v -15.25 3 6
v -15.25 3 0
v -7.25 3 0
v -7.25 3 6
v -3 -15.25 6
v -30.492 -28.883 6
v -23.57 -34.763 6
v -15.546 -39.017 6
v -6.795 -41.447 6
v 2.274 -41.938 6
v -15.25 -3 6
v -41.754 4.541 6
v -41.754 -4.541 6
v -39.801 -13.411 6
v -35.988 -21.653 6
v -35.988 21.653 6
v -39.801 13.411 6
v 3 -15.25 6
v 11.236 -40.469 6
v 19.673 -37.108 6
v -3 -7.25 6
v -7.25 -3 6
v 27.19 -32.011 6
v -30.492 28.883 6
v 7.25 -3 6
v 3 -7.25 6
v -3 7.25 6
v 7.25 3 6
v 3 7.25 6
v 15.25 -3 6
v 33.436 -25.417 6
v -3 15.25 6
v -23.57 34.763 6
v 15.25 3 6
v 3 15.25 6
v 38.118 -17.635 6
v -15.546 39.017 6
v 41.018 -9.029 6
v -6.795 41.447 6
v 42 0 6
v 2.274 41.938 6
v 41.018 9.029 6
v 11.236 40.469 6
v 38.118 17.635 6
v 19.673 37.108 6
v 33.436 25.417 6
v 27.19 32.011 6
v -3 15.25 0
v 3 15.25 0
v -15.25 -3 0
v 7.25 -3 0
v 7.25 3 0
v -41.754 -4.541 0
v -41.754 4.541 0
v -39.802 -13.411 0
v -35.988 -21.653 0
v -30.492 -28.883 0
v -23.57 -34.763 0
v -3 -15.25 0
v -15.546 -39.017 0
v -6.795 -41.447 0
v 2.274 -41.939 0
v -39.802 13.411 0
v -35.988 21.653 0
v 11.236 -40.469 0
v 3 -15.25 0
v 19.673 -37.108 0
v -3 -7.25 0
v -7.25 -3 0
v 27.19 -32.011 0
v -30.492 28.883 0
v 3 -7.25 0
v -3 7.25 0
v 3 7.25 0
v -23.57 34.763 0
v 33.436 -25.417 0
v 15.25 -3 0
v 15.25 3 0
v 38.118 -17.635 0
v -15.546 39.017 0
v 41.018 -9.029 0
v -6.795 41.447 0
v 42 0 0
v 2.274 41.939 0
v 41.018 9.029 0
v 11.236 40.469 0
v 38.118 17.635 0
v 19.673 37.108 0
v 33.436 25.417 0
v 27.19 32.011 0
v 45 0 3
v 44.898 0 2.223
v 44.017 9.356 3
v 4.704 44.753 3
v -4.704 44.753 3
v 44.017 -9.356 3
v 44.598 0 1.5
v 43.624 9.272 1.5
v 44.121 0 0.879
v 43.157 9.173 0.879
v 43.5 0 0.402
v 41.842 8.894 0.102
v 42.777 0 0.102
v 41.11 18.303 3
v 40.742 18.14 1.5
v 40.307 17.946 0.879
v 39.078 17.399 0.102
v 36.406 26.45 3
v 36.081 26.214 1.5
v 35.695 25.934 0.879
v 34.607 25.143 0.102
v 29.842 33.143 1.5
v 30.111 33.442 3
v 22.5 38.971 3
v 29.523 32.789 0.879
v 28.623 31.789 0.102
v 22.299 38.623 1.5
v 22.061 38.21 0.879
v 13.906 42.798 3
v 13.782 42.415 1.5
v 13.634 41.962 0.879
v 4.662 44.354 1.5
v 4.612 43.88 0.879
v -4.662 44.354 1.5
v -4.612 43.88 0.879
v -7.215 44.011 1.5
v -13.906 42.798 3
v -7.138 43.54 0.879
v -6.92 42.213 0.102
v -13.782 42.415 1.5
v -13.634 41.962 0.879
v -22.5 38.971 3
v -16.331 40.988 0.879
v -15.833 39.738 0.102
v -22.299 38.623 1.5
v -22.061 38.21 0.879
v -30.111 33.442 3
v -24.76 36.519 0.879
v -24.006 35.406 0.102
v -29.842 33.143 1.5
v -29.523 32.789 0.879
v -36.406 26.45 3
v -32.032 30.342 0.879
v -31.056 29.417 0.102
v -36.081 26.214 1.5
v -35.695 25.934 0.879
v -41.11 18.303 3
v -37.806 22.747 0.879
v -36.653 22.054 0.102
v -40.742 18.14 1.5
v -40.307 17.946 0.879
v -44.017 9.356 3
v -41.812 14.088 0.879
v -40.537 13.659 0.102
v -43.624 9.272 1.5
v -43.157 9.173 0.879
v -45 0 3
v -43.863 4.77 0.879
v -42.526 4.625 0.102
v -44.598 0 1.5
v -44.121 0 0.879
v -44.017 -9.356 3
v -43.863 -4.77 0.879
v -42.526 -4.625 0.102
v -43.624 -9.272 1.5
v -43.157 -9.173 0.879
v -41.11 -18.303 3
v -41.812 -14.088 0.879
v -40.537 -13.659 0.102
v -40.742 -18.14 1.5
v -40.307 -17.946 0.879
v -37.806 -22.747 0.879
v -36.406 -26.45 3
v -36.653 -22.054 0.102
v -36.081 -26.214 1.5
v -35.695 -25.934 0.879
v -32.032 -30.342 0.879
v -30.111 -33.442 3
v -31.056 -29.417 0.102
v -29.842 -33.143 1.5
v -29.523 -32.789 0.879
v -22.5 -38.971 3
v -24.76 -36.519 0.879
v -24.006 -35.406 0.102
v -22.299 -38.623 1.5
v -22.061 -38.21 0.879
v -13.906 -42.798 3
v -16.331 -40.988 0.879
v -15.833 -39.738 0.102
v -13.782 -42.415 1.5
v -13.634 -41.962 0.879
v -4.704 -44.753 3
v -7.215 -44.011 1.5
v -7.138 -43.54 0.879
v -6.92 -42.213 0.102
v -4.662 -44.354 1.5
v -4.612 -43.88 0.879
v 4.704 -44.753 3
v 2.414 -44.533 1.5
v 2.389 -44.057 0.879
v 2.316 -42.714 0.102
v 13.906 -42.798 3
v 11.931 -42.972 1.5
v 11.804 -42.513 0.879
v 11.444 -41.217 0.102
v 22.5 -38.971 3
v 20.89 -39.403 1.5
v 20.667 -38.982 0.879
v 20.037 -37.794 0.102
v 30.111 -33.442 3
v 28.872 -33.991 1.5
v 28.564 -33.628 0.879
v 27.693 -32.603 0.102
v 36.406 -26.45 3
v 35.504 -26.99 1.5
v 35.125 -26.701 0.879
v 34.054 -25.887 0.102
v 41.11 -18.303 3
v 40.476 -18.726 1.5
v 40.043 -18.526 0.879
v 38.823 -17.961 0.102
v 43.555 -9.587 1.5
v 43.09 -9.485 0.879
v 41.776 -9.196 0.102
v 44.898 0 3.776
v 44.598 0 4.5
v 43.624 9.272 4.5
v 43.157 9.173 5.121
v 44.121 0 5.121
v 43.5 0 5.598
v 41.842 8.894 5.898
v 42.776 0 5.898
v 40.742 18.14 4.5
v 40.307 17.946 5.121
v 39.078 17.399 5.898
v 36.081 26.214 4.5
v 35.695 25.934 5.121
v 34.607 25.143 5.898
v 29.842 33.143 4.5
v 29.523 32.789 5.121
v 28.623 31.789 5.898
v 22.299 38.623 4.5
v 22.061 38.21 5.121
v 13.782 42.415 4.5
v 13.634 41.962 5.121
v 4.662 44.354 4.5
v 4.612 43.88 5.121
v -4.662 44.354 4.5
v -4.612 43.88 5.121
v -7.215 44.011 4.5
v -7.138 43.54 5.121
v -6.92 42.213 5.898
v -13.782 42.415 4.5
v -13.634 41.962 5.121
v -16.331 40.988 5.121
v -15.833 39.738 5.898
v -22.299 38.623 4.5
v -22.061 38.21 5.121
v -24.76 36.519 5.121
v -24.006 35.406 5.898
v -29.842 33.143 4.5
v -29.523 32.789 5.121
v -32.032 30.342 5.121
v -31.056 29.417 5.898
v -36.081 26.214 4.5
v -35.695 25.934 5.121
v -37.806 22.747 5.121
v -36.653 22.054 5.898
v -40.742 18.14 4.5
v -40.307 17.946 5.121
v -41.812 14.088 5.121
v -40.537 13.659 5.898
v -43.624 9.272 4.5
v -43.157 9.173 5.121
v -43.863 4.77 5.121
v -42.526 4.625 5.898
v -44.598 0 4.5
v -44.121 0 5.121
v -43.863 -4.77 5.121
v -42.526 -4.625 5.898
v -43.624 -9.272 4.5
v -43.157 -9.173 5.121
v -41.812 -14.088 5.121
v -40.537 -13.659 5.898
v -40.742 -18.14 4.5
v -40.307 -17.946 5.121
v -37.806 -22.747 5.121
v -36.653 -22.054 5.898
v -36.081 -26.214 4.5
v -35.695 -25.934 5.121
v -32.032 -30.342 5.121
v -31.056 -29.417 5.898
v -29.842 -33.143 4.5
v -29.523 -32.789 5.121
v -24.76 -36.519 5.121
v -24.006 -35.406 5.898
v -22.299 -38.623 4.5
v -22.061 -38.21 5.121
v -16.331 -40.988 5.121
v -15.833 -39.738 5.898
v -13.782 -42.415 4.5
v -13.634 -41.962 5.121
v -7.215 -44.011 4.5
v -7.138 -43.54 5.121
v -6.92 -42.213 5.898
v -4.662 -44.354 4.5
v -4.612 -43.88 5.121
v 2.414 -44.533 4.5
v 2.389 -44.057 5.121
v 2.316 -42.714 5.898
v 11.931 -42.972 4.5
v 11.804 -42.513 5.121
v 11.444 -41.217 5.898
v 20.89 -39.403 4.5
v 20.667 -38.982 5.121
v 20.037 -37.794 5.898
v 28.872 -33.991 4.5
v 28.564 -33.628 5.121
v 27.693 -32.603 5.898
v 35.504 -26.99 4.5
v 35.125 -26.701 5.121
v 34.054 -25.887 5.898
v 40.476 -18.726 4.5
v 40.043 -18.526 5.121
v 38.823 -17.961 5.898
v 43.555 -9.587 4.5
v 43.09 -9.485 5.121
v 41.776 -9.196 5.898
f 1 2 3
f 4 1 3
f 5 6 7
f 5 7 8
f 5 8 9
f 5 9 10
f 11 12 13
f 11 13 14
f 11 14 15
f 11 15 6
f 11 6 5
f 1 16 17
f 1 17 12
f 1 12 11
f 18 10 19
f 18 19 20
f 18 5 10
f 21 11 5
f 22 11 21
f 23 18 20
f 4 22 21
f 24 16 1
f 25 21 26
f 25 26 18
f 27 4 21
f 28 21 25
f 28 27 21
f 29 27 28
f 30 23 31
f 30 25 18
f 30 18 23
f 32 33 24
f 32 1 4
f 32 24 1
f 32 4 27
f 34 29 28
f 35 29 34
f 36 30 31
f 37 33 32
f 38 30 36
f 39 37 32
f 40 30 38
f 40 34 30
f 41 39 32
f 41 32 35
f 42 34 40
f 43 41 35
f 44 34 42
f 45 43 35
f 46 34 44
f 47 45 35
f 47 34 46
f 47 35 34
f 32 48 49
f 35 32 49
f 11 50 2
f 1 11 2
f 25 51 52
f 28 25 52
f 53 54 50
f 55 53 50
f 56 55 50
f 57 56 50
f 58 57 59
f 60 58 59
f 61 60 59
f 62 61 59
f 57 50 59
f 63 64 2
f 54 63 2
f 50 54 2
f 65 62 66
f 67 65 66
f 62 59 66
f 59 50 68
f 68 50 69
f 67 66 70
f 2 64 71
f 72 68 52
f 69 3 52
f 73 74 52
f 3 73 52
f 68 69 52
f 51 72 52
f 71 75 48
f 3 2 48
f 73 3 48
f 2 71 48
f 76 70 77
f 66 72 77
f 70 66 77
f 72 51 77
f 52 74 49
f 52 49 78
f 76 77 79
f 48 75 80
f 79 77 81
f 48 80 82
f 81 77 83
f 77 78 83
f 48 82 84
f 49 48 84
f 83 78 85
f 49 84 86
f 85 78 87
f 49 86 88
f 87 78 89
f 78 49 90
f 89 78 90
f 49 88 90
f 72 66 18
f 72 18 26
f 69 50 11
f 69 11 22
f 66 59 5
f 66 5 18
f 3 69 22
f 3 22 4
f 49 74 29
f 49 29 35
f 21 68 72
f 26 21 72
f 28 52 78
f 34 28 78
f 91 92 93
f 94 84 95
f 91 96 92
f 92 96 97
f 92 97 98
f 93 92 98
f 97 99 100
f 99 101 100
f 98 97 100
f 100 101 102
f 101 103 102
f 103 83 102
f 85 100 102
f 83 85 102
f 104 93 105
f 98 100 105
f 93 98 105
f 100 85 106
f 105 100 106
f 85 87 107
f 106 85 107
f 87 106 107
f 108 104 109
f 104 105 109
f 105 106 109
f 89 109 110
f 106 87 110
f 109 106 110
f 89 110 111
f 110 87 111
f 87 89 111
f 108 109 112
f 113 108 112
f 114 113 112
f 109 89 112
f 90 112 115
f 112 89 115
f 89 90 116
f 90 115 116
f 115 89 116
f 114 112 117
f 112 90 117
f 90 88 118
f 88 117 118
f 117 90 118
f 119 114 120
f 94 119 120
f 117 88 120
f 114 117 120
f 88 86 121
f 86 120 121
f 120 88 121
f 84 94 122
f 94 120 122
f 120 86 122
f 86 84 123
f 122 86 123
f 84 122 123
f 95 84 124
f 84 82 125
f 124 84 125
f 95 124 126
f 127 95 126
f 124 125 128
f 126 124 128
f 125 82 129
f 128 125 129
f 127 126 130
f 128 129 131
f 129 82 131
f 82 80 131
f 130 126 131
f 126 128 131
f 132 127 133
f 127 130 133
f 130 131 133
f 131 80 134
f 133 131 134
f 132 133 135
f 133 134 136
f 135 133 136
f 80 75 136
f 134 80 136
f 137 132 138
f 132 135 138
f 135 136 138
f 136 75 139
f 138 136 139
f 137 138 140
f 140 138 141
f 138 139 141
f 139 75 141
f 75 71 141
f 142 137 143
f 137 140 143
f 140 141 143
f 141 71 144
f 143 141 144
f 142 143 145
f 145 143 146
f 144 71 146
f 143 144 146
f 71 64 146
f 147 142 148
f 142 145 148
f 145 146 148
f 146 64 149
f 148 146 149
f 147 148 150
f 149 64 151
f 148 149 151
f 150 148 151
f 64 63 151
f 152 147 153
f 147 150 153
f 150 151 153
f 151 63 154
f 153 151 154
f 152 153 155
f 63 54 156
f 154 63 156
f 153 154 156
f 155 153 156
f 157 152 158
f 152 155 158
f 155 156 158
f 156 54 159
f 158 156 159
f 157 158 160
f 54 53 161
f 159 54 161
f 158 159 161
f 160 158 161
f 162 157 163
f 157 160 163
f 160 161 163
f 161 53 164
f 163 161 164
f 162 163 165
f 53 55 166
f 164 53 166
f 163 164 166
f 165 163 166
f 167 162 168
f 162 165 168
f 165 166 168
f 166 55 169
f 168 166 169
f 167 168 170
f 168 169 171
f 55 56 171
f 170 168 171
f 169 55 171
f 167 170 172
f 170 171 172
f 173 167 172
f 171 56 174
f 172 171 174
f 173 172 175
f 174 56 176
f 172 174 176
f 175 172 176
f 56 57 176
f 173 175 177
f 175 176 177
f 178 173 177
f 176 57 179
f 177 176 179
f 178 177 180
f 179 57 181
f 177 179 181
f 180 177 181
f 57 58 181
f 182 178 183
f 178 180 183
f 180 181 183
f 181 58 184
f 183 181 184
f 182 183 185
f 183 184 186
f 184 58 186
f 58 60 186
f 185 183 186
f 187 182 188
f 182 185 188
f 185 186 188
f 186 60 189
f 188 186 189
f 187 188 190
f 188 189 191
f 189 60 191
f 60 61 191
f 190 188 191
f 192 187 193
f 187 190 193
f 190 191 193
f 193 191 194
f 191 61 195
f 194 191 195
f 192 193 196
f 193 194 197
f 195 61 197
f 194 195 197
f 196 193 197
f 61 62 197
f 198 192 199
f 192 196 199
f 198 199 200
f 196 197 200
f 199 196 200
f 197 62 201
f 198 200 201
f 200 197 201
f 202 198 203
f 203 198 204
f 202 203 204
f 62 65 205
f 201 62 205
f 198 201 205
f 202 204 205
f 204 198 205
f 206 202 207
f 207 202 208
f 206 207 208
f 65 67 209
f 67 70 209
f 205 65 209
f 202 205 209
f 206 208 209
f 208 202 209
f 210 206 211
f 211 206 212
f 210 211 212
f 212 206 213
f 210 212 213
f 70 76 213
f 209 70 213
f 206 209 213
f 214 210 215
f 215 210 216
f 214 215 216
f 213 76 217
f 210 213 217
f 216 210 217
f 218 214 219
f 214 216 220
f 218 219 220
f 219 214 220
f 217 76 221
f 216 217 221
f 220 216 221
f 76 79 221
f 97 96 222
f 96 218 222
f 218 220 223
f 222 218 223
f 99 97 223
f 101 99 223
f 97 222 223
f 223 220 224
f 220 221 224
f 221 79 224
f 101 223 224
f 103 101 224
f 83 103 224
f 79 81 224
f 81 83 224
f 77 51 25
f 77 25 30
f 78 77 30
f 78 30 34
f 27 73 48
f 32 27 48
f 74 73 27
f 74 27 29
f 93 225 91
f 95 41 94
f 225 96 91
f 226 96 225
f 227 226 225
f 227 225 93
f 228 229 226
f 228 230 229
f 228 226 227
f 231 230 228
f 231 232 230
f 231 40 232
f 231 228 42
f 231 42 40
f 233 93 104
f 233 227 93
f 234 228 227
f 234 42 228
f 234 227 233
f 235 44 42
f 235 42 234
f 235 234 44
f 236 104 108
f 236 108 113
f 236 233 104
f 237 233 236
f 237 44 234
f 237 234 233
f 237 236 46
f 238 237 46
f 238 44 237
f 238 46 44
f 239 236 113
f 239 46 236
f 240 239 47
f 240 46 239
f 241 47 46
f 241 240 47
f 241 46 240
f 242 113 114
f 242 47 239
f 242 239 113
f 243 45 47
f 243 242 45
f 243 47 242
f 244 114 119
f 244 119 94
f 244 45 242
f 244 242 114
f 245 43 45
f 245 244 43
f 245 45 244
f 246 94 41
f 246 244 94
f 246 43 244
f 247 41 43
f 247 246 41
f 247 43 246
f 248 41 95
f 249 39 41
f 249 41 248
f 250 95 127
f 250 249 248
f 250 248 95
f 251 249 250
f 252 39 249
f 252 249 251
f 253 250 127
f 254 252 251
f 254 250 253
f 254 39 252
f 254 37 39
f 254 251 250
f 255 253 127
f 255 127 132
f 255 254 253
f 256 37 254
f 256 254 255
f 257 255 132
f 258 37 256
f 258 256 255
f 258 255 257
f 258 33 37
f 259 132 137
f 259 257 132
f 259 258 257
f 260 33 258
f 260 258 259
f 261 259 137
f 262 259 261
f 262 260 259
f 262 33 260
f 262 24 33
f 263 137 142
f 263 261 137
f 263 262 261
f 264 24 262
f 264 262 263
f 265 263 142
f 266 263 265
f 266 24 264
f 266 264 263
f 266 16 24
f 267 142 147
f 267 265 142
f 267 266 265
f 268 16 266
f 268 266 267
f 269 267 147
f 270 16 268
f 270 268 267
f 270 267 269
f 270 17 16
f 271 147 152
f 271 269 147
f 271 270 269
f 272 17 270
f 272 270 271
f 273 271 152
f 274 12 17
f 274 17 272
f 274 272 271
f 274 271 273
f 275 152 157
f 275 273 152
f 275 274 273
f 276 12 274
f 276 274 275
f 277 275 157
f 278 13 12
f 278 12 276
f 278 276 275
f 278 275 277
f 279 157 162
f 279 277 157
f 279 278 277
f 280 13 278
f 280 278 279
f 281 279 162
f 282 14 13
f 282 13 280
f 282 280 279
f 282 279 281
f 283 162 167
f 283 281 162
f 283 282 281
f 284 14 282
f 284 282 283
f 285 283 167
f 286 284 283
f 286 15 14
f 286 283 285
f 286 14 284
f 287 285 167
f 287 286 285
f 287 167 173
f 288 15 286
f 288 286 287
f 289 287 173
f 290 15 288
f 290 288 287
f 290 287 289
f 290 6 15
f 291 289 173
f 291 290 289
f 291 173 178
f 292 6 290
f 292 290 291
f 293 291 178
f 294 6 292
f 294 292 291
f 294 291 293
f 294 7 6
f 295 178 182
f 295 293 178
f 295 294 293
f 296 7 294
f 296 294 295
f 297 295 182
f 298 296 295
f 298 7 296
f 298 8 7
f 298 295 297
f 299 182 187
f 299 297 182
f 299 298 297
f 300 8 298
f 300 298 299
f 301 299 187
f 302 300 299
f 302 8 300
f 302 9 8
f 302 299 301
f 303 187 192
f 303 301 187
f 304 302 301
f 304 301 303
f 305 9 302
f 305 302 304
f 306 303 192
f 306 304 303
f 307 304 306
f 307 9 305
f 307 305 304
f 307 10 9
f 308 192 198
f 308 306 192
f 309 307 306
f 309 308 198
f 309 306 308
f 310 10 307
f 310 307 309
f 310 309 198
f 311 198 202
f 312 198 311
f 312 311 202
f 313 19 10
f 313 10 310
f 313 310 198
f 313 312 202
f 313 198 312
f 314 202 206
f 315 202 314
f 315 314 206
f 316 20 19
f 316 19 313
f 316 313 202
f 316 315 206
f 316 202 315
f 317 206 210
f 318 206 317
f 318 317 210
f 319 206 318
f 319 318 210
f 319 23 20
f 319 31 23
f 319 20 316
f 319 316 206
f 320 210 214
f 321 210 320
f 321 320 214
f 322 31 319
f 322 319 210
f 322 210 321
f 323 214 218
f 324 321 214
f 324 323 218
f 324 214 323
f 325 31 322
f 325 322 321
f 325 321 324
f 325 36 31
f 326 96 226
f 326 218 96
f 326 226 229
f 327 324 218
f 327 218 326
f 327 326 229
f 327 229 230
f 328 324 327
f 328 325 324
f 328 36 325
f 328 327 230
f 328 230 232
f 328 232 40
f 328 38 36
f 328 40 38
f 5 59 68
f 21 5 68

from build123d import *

# Parameters (mm, degrees)
SKETCH1_R           = 45
SKETCH1_W           = 8
SKETCH1_H           = 6
SKETCH1_W_2         = 6
SKETCH1_H_2         = 8
BOSS_EXTRUDE1_DEPTH = 6
FILLET1_R           = 3
FILLET2_R           = 3


with BuildPart() as part:
    # Sketch1 → Boss-Extrude1 (new body)
    with BuildSketch(Plane.XY):
        Circle(SKETCH1_R)
        with Locations((11.25, 0)):
            Rectangle(SKETCH1_W, SKETCH1_H, mode=Mode.SUBTRACT)
        with Locations((0, -11.25)):
            Rectangle(SKETCH1_W_2, SKETCH1_H_2, mode=Mode.SUBTRACT)
        with Locations((-11.25, 0)):
            Rectangle(SKETCH1_W, SKETCH1_H, mode=Mode.SUBTRACT)
        with Locations((0, 11.25)):
            Rectangle(SKETCH1_W_2, SKETCH1_H_2, mode=Mode.SUBTRACT)
    extrude(amount=BOSS_EXTRUDE1_DEPTH)

    # Fillet1
    fillet1_edges = [part.edges().sort_by_distance(p)[0] for p in [
        (-45, 0, 6),
    ]]
    fillet(fillet1_edges, radius=FILLET1_R)

    # Fillet2
    fillet2_edges = [part.edges().sort_by_distance(p)[0] for p in [
        (-45, 0, 0),
    ]]
    fillet(fillet2_edges, radius=FILLET2_R - 0.0001)  # a hair under: the kernel refuses the full size


solid = part.part
